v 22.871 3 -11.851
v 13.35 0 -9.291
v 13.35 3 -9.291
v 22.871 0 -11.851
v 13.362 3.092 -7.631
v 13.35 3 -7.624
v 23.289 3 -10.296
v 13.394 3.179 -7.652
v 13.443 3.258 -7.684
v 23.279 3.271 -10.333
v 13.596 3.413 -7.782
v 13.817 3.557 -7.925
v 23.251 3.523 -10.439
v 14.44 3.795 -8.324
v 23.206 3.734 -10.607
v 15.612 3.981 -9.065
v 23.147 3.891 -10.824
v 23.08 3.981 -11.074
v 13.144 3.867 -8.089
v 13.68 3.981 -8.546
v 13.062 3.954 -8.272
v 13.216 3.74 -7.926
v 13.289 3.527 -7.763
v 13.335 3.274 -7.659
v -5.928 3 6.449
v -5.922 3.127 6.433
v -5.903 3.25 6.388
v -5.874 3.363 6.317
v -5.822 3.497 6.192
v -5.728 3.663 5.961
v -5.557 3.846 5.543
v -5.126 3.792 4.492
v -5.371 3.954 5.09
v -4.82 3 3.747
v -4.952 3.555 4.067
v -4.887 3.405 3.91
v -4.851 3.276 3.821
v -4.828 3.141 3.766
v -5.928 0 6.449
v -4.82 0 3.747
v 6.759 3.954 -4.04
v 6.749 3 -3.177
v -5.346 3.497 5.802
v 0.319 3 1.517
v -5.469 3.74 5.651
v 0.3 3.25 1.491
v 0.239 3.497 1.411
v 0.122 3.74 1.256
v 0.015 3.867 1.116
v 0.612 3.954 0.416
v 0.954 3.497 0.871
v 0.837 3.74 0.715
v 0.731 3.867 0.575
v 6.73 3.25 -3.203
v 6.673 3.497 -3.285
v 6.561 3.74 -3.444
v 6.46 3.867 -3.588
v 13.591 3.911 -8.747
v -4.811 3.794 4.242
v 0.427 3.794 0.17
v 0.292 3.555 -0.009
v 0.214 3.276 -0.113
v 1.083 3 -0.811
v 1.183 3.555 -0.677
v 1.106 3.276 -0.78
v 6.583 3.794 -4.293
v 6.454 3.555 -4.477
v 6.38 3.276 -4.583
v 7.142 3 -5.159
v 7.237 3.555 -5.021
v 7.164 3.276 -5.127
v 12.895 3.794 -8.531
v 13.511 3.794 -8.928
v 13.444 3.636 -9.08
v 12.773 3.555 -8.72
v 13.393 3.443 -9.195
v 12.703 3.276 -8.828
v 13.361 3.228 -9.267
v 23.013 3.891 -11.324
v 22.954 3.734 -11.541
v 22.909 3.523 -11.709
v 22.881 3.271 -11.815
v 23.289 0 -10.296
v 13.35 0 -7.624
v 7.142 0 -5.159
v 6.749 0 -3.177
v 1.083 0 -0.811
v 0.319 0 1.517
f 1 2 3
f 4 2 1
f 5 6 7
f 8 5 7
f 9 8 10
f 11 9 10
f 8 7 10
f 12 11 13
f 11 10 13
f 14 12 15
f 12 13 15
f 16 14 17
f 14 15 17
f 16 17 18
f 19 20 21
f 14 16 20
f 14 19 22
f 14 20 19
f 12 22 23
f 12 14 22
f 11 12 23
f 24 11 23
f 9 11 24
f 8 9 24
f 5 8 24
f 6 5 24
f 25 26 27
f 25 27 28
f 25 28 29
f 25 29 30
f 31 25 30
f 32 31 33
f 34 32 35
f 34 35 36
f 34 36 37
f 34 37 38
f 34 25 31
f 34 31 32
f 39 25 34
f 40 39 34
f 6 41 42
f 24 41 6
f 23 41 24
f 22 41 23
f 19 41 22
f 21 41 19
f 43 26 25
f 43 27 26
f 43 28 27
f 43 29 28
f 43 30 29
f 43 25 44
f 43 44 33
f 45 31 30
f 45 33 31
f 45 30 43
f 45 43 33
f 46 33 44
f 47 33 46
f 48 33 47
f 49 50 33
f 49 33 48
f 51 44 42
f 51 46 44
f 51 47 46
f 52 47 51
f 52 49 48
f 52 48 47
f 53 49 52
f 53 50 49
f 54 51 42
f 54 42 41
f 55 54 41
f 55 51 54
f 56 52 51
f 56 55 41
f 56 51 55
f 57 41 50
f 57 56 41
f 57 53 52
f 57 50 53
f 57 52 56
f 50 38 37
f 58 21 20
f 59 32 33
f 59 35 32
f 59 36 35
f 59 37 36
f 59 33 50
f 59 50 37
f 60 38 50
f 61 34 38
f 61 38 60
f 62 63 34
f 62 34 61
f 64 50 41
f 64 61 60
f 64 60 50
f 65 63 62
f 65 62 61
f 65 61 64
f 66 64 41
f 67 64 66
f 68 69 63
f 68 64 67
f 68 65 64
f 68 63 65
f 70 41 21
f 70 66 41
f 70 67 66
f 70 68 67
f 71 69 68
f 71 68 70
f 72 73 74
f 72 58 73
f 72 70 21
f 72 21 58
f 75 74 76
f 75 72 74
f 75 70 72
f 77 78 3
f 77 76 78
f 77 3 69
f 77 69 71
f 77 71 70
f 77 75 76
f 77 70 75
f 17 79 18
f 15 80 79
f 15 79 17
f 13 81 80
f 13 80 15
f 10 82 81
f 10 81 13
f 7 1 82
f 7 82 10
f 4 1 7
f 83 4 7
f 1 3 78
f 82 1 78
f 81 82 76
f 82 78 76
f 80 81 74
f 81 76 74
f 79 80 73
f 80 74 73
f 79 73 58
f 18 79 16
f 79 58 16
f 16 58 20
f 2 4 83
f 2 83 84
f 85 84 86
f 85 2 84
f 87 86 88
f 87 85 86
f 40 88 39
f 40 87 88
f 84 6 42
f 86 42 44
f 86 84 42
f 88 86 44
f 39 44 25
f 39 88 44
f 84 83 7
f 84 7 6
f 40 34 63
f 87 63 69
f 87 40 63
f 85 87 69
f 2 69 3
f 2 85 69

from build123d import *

# Parameters (mm, degrees)
EXTRUDE_1_DEPTH = 4
FILLET_1_R      = 1


with BuildPart() as part:
    # 草图1 → 凸台-拉伸1 (new body)
    with BuildSketch(Plane(origin=(0, 0, 0), x_dir=(1, 0, 0), z_dir=(0, 1, 0))):
        with BuildLine():
            Line((-5.928068954, -6.449296909), (-4.820160255, -3.746554363))
            ThreePointArc((-4.820160255, -3.746554363), (4.093177489, 3.01181264), (13.350341007, 9.290987577))
            Line((13.350341007, 9.290987577), (22.871021424, 11.851023114))
            Line((22.871021424, 11.851023114), (23.289072647, 10.296305596))
            Line((23.289072647, 10.296305596), (13.350341007, 7.623859397))
            ThreePointArc((13.350341007, 7.623859397), (3.511743095, 0.860423855), (-5.928068954, -6.449296909))
        make_face()
    extrude(amount=EXTRUDE_1_DEPTH)

    # 圆角1
    # the kernel refuses this fillet: 1 mm, written as the material it takes off along each edge
    with BuildSketch(Plane(origin=(127.771889532, 4, 169.359958319), x_dir=(-0.6341416592780885, 0, -0.7732168880514914), z_dir=(-0.7732168880514914, 0, 0.6341416592780885))) as fillet_1_piece_1:
        with BuildLine():
            CenterArc((212.151953176 - FILLET_1_R, FILLET_1_R), FILLET_1_R, 270, 90)
            Line((212.151953176 - FILLET_1_R, 0), (212.151953176, 0))
            Line((212.151953176, 0), (212.151953176, FILLET_1_R))
        make_face()
    revolve(axis=Axis((127.771889532, 4, 169.359958319), (0, -1, 0)), revolution_arc=7.865584332, mode=Mode.SUBTRACT)
    # the kernel refuses this fillet: 1 mm, written as the material it takes off along each edge
    with BuildSketch(Plane(origin=(12.521058721, 4, -9.06800014), x_dir=(0.2596684924125265, 0, 0.9656978171499642), z_dir=(0.9656978171499642, 0, -0.2596684924125265))) as fillet_1_2_piece_1:
        with BuildLine():
            CenterArc((FILLET_1_R, FILLET_1_R), FILLET_1_R, 180, 90)
            Line((0, FILLET_1_R), (0, 0))
            Line((0, 0), (FILLET_1_R, 0))
        make_face()
    extrude(amount=13.21759977, mode=Mode.SUBTRACT)
    # the kernel refuses this fillet: 1 mm, written as the material it takes off along each edge
    with BuildSketch(Plane(origin=(25.70331719, 4, -10.945476827), x_dir=(-0.25966849241252477, 0, -0.9656978171499647), z_dir=(-0.9656978171499647, 0, 0.25966849241252477))) as fillet_1_3_piece_1_section:
        with BuildLine():
            CenterArc((FILLET_1_R, FILLET_1_R), FILLET_1_R, 180, 90)
            Line((0, FILLET_1_R), (0, 0))
            Line((0, 0), (FILLET_1_R, 0))
        make_face()
    fillet_1_3_piece_1 = extrude(amount=15.291761526, mode=Mode.PRIVATE)
    fillet_1_3_piece_1 = fillet_1_3_piece_1 & Plane(origin=(127.771889532, 4, 169.359958319), x_dir=(-0.5429254971555654, 0, -0.8397808669756547), z_dir=(0, -1, 0)) * Cylinder(210.75, 35, mode=Mode.PRIVATE)
    add(fillet_1_3_piece_1, mode=Mode.SUBTRACT)
    # the kernel refuses this fillet: 1 mm, written as the material it takes off along each edge
    with BuildSketch(Plane(origin=(127.771889532, 4, 169.359958319), x_dir=(-0.6435256080636699, 0, -0.765424582677016), z_dir=(-0.765424582677016, 0, 0.6435256080636699))) as fillet_1_4_piece_1_section:
        with BuildLine():
            CenterArc((210.75 + FILLET_1_R, FILLET_1_R), FILLET_1_R, 180, 90)
            Line((210.75 + FILLET_1_R, 0), (210.75, 0))
            Line((210.75, 0), (210.75, FILLET_1_R))
        make_face()
    fillet_1_4_piece_1 = revolve(axis=Axis((127.771889532, 4, 169.359958319), (0, -1, 0)), revolution_arc=8.877330019, mode=Mode.PRIVATE)
    fillet_1_4_piece_1 = fillet_1_4_piece_1 - Plane(origin=(75.416344667, 3, -25.348436689), x_dir=(0, 1, 0), z_dir=(0.9656978171499647, 0, -0.25966849241252477)) * Cylinder(1, 848, mode=Mode.PRIVATE)
    add(fillet_1_4_piece_1, mode=Mode.SUBTRACT)


solid = part.part
